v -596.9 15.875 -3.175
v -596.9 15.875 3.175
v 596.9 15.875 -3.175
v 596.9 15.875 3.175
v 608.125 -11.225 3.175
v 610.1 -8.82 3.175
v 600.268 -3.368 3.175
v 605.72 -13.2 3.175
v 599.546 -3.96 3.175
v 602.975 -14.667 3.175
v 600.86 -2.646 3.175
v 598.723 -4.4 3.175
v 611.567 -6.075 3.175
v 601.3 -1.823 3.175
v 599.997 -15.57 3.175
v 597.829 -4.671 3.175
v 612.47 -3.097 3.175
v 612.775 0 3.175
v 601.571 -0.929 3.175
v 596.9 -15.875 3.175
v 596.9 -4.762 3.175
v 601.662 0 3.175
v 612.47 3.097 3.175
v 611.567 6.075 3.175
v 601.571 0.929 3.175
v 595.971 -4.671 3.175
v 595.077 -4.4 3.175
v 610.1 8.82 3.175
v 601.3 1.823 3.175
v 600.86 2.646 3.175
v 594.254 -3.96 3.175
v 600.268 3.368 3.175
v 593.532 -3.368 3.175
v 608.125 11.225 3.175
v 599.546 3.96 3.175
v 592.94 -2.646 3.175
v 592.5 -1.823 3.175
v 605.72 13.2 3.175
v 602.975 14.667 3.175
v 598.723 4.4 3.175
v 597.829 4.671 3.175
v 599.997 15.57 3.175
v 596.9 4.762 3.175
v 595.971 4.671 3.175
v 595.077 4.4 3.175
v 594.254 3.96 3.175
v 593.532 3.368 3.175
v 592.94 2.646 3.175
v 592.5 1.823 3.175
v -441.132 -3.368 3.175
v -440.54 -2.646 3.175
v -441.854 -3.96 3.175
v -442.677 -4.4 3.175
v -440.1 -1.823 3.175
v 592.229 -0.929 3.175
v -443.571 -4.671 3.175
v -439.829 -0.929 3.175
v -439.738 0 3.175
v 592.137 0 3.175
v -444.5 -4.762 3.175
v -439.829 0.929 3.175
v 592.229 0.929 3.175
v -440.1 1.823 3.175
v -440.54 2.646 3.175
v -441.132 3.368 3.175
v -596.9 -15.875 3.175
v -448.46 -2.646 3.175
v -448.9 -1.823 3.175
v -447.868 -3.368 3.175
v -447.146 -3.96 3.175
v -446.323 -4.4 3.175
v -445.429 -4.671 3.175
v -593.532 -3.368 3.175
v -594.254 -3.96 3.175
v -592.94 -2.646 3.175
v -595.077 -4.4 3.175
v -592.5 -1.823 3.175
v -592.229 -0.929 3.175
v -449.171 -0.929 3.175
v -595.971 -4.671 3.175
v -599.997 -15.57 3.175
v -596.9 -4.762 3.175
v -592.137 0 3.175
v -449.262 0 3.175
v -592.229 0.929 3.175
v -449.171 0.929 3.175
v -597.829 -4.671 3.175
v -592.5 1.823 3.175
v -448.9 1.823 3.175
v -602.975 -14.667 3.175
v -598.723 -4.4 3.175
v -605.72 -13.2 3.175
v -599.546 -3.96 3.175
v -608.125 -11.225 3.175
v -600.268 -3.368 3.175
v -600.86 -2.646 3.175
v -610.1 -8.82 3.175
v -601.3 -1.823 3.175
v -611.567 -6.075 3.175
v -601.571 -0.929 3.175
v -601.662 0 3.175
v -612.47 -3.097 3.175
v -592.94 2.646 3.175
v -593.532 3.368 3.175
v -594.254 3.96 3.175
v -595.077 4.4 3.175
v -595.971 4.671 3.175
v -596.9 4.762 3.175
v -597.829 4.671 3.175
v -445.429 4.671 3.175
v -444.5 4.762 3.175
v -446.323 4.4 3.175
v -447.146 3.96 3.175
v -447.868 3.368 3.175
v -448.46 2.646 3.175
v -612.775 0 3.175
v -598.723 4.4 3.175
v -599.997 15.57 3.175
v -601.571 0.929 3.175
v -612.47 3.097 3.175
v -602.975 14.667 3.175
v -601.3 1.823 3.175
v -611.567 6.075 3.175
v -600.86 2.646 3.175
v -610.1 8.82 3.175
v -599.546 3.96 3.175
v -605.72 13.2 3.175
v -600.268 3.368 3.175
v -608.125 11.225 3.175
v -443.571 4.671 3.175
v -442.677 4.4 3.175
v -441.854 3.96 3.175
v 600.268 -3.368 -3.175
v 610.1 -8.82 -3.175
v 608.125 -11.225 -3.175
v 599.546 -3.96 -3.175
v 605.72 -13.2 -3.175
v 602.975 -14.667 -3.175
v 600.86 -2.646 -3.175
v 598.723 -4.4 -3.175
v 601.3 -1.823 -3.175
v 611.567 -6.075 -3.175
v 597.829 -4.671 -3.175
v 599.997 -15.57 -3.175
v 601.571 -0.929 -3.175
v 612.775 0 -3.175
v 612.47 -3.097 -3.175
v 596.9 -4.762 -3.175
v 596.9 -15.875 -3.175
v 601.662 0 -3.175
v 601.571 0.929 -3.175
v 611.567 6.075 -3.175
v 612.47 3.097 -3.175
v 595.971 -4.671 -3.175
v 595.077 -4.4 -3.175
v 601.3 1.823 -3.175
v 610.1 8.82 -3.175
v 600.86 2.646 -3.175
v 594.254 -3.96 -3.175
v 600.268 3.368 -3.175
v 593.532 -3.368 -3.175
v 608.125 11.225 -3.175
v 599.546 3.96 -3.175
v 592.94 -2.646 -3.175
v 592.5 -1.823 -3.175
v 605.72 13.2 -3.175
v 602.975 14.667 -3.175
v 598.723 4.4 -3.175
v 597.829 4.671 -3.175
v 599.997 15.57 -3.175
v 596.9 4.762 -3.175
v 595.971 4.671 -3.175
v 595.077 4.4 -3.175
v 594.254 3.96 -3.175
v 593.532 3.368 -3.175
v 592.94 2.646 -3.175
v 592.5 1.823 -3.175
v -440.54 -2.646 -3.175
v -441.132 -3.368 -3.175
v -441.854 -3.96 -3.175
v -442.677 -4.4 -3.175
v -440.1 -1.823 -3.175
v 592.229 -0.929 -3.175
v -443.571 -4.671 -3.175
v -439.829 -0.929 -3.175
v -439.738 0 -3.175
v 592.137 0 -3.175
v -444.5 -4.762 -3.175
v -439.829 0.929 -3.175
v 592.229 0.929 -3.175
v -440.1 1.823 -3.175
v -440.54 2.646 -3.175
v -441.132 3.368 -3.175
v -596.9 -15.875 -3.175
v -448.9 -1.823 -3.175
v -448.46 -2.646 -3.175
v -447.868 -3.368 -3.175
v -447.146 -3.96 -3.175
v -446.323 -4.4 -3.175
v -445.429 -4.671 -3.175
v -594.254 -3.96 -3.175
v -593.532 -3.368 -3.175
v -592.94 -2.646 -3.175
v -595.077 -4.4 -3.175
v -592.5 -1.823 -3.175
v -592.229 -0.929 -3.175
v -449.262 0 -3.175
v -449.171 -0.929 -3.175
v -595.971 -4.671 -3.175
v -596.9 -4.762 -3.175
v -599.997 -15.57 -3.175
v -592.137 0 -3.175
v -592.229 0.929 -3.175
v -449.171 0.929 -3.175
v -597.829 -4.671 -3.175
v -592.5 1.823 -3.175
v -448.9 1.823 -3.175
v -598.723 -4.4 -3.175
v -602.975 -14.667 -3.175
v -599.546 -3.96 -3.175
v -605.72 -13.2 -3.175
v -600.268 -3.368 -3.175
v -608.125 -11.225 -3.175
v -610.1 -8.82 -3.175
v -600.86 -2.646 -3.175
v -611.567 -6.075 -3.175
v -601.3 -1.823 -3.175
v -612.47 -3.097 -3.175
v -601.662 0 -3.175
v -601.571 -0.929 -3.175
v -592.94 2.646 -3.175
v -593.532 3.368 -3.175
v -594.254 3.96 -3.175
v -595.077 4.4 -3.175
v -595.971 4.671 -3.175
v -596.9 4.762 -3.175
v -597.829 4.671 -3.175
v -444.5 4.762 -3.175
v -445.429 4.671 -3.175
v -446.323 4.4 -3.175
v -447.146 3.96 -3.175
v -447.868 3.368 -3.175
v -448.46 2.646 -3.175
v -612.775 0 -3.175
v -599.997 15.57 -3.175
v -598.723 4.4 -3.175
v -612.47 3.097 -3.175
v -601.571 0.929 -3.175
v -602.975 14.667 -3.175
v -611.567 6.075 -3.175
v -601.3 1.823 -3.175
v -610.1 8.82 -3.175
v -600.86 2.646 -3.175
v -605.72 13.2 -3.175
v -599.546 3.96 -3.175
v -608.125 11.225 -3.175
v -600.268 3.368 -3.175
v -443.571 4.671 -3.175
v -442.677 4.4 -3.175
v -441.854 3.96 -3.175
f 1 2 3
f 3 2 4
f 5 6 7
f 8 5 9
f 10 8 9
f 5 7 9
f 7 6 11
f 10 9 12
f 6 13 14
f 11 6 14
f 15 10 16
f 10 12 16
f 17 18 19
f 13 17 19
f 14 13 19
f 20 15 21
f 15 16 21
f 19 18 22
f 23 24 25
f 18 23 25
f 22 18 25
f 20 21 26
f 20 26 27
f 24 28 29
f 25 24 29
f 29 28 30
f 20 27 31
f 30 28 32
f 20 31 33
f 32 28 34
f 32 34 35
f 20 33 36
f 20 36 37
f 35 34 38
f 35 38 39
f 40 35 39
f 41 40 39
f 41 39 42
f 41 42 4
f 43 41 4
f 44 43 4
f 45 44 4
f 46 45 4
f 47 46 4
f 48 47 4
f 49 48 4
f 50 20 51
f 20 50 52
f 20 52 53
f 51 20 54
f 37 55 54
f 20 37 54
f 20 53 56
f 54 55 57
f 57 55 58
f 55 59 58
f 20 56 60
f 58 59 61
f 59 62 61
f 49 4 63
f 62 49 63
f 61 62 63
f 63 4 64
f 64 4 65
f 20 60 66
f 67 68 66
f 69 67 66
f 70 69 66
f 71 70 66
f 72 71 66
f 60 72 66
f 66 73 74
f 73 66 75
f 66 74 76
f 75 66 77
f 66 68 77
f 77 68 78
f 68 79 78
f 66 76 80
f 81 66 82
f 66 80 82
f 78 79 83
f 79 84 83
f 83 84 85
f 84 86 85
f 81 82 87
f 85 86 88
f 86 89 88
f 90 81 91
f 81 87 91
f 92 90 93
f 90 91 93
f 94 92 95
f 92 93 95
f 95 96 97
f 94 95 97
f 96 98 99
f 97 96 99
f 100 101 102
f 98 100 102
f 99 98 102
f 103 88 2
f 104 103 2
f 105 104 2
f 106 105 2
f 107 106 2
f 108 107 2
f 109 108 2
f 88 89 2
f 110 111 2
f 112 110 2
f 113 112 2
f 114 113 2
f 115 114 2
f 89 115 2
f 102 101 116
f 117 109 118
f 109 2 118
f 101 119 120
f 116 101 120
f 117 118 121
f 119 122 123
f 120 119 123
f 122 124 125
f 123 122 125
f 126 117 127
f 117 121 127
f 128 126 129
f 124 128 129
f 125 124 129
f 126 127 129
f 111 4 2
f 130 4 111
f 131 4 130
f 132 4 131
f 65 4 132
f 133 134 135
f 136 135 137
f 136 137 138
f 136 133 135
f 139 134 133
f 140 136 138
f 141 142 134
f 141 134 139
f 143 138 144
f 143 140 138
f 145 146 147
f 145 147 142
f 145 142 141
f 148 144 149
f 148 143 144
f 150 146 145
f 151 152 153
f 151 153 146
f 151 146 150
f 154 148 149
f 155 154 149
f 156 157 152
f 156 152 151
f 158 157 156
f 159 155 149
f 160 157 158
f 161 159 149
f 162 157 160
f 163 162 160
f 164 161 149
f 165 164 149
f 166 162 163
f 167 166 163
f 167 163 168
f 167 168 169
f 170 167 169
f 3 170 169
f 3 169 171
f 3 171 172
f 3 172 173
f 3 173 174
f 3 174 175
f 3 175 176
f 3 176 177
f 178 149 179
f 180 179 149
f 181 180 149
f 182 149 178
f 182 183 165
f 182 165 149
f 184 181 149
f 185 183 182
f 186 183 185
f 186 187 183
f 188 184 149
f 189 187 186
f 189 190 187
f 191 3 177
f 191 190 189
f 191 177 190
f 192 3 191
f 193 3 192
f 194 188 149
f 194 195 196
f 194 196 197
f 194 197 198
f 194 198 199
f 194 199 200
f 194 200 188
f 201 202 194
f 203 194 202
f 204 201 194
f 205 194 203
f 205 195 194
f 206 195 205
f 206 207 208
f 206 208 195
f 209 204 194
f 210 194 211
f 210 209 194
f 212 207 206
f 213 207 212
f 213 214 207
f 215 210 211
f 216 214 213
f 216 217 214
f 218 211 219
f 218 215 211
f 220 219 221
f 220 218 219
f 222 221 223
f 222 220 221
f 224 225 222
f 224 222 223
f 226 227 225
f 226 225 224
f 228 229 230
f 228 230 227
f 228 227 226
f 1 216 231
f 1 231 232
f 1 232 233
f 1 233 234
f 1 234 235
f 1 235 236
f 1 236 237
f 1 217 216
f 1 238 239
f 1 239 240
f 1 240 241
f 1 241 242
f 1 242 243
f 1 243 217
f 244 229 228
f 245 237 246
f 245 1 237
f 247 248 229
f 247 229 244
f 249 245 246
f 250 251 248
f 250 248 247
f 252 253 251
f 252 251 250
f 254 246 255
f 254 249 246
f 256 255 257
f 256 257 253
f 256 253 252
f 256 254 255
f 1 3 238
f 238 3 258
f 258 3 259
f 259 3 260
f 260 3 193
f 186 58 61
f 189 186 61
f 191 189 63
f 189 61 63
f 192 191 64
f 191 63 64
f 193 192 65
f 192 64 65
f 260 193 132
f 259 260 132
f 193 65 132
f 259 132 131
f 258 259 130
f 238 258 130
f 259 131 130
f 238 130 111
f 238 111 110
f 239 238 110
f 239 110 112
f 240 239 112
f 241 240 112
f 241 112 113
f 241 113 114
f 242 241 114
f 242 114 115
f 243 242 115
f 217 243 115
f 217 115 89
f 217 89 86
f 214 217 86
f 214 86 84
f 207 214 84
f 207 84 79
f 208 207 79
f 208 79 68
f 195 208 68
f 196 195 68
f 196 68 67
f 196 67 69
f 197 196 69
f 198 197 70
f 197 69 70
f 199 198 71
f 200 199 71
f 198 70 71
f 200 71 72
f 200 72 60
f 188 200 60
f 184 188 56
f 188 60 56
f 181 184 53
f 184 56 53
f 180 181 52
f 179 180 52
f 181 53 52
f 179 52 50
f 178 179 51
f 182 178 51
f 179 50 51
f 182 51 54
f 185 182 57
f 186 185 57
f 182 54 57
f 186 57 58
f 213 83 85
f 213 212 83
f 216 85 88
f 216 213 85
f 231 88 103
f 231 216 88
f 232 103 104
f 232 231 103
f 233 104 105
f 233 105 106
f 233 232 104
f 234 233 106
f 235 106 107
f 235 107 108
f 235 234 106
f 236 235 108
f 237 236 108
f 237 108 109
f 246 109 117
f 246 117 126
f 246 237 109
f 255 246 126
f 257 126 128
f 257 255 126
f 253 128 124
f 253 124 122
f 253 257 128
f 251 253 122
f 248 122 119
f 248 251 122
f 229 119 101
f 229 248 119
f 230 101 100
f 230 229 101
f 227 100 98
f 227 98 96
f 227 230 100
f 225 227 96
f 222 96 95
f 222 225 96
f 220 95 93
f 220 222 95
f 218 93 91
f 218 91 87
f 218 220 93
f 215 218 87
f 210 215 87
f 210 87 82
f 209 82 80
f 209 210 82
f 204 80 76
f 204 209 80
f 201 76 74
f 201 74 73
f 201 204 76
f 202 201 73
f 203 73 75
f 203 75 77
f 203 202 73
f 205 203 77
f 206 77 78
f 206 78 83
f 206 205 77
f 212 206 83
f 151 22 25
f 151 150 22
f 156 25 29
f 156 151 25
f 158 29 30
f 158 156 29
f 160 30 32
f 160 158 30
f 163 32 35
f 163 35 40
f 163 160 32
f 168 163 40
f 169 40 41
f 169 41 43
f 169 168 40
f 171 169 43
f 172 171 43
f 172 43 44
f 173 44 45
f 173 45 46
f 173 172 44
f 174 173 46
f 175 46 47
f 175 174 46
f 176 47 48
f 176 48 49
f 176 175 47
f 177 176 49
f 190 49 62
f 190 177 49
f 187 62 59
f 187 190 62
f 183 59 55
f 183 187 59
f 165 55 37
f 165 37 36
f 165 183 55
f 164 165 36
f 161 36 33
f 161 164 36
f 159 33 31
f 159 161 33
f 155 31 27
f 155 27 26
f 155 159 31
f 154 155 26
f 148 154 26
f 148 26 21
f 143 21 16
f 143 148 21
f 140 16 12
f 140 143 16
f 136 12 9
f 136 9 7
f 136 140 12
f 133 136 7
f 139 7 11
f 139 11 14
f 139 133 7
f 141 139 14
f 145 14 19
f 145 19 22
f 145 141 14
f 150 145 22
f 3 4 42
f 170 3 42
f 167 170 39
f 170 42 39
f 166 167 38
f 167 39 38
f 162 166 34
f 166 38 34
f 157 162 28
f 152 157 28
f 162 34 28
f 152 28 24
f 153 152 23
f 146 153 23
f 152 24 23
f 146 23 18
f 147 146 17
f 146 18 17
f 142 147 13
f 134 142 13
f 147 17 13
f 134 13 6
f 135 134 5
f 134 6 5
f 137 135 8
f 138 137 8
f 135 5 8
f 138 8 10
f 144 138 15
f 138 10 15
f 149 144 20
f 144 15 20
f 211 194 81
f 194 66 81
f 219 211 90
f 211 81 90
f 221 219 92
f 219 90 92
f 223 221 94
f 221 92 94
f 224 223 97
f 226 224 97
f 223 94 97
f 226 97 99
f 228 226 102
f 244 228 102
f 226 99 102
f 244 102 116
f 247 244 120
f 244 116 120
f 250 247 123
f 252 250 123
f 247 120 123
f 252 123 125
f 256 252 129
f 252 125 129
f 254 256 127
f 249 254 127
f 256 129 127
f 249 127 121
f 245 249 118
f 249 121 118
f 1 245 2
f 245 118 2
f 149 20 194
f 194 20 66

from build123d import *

# Parameters (mm, degrees)
SKETCH1_R           = 4.7625
BOSS_EXTRUDE1_DEPTH = 3.175
SKETCH2_R           = 4.7625
CUT_EXTRUDE1_DEPTH  = 614.01348986


with BuildPart() as part:
    # Sketch1 → Boss-Extrude1 (new, symmetric)
    with BuildSketch(Plane.XY):
        with BuildLine():
            Line((596.9, -15.875), (-596.9, -15.875))
            ThreePointArc((-596.9, -15.875), (-612.775, 0), (-596.9, 15.875))
            Line((-596.9, 15.875), (596.9, 15.875))
            ThreePointArc((596.9, 15.875), (612.775, 0), (596.9, -15.875))
        make_face()
        with Locations((-596.9, 0)):
            Circle(SKETCH1_R, mode=Mode.SUBTRACT)
        with Locations((596.9, 0)):
            Circle(SKETCH1_R, mode=Mode.SUBTRACT)
    extrude(amount=BOSS_EXTRUDE1_DEPTH, both=True)

    # Sketch2 → Cut-Extrude1 (cut, through all)
    with BuildSketch(Plane.XY.offset(3.175)):
        with Locations((-444.5, 0)):
            Circle(SKETCH2_R)
    extrude(amount=-CUT_EXTRUDE1_DEPTH, mode=Mode.SUBTRACT)


solid = part.part
